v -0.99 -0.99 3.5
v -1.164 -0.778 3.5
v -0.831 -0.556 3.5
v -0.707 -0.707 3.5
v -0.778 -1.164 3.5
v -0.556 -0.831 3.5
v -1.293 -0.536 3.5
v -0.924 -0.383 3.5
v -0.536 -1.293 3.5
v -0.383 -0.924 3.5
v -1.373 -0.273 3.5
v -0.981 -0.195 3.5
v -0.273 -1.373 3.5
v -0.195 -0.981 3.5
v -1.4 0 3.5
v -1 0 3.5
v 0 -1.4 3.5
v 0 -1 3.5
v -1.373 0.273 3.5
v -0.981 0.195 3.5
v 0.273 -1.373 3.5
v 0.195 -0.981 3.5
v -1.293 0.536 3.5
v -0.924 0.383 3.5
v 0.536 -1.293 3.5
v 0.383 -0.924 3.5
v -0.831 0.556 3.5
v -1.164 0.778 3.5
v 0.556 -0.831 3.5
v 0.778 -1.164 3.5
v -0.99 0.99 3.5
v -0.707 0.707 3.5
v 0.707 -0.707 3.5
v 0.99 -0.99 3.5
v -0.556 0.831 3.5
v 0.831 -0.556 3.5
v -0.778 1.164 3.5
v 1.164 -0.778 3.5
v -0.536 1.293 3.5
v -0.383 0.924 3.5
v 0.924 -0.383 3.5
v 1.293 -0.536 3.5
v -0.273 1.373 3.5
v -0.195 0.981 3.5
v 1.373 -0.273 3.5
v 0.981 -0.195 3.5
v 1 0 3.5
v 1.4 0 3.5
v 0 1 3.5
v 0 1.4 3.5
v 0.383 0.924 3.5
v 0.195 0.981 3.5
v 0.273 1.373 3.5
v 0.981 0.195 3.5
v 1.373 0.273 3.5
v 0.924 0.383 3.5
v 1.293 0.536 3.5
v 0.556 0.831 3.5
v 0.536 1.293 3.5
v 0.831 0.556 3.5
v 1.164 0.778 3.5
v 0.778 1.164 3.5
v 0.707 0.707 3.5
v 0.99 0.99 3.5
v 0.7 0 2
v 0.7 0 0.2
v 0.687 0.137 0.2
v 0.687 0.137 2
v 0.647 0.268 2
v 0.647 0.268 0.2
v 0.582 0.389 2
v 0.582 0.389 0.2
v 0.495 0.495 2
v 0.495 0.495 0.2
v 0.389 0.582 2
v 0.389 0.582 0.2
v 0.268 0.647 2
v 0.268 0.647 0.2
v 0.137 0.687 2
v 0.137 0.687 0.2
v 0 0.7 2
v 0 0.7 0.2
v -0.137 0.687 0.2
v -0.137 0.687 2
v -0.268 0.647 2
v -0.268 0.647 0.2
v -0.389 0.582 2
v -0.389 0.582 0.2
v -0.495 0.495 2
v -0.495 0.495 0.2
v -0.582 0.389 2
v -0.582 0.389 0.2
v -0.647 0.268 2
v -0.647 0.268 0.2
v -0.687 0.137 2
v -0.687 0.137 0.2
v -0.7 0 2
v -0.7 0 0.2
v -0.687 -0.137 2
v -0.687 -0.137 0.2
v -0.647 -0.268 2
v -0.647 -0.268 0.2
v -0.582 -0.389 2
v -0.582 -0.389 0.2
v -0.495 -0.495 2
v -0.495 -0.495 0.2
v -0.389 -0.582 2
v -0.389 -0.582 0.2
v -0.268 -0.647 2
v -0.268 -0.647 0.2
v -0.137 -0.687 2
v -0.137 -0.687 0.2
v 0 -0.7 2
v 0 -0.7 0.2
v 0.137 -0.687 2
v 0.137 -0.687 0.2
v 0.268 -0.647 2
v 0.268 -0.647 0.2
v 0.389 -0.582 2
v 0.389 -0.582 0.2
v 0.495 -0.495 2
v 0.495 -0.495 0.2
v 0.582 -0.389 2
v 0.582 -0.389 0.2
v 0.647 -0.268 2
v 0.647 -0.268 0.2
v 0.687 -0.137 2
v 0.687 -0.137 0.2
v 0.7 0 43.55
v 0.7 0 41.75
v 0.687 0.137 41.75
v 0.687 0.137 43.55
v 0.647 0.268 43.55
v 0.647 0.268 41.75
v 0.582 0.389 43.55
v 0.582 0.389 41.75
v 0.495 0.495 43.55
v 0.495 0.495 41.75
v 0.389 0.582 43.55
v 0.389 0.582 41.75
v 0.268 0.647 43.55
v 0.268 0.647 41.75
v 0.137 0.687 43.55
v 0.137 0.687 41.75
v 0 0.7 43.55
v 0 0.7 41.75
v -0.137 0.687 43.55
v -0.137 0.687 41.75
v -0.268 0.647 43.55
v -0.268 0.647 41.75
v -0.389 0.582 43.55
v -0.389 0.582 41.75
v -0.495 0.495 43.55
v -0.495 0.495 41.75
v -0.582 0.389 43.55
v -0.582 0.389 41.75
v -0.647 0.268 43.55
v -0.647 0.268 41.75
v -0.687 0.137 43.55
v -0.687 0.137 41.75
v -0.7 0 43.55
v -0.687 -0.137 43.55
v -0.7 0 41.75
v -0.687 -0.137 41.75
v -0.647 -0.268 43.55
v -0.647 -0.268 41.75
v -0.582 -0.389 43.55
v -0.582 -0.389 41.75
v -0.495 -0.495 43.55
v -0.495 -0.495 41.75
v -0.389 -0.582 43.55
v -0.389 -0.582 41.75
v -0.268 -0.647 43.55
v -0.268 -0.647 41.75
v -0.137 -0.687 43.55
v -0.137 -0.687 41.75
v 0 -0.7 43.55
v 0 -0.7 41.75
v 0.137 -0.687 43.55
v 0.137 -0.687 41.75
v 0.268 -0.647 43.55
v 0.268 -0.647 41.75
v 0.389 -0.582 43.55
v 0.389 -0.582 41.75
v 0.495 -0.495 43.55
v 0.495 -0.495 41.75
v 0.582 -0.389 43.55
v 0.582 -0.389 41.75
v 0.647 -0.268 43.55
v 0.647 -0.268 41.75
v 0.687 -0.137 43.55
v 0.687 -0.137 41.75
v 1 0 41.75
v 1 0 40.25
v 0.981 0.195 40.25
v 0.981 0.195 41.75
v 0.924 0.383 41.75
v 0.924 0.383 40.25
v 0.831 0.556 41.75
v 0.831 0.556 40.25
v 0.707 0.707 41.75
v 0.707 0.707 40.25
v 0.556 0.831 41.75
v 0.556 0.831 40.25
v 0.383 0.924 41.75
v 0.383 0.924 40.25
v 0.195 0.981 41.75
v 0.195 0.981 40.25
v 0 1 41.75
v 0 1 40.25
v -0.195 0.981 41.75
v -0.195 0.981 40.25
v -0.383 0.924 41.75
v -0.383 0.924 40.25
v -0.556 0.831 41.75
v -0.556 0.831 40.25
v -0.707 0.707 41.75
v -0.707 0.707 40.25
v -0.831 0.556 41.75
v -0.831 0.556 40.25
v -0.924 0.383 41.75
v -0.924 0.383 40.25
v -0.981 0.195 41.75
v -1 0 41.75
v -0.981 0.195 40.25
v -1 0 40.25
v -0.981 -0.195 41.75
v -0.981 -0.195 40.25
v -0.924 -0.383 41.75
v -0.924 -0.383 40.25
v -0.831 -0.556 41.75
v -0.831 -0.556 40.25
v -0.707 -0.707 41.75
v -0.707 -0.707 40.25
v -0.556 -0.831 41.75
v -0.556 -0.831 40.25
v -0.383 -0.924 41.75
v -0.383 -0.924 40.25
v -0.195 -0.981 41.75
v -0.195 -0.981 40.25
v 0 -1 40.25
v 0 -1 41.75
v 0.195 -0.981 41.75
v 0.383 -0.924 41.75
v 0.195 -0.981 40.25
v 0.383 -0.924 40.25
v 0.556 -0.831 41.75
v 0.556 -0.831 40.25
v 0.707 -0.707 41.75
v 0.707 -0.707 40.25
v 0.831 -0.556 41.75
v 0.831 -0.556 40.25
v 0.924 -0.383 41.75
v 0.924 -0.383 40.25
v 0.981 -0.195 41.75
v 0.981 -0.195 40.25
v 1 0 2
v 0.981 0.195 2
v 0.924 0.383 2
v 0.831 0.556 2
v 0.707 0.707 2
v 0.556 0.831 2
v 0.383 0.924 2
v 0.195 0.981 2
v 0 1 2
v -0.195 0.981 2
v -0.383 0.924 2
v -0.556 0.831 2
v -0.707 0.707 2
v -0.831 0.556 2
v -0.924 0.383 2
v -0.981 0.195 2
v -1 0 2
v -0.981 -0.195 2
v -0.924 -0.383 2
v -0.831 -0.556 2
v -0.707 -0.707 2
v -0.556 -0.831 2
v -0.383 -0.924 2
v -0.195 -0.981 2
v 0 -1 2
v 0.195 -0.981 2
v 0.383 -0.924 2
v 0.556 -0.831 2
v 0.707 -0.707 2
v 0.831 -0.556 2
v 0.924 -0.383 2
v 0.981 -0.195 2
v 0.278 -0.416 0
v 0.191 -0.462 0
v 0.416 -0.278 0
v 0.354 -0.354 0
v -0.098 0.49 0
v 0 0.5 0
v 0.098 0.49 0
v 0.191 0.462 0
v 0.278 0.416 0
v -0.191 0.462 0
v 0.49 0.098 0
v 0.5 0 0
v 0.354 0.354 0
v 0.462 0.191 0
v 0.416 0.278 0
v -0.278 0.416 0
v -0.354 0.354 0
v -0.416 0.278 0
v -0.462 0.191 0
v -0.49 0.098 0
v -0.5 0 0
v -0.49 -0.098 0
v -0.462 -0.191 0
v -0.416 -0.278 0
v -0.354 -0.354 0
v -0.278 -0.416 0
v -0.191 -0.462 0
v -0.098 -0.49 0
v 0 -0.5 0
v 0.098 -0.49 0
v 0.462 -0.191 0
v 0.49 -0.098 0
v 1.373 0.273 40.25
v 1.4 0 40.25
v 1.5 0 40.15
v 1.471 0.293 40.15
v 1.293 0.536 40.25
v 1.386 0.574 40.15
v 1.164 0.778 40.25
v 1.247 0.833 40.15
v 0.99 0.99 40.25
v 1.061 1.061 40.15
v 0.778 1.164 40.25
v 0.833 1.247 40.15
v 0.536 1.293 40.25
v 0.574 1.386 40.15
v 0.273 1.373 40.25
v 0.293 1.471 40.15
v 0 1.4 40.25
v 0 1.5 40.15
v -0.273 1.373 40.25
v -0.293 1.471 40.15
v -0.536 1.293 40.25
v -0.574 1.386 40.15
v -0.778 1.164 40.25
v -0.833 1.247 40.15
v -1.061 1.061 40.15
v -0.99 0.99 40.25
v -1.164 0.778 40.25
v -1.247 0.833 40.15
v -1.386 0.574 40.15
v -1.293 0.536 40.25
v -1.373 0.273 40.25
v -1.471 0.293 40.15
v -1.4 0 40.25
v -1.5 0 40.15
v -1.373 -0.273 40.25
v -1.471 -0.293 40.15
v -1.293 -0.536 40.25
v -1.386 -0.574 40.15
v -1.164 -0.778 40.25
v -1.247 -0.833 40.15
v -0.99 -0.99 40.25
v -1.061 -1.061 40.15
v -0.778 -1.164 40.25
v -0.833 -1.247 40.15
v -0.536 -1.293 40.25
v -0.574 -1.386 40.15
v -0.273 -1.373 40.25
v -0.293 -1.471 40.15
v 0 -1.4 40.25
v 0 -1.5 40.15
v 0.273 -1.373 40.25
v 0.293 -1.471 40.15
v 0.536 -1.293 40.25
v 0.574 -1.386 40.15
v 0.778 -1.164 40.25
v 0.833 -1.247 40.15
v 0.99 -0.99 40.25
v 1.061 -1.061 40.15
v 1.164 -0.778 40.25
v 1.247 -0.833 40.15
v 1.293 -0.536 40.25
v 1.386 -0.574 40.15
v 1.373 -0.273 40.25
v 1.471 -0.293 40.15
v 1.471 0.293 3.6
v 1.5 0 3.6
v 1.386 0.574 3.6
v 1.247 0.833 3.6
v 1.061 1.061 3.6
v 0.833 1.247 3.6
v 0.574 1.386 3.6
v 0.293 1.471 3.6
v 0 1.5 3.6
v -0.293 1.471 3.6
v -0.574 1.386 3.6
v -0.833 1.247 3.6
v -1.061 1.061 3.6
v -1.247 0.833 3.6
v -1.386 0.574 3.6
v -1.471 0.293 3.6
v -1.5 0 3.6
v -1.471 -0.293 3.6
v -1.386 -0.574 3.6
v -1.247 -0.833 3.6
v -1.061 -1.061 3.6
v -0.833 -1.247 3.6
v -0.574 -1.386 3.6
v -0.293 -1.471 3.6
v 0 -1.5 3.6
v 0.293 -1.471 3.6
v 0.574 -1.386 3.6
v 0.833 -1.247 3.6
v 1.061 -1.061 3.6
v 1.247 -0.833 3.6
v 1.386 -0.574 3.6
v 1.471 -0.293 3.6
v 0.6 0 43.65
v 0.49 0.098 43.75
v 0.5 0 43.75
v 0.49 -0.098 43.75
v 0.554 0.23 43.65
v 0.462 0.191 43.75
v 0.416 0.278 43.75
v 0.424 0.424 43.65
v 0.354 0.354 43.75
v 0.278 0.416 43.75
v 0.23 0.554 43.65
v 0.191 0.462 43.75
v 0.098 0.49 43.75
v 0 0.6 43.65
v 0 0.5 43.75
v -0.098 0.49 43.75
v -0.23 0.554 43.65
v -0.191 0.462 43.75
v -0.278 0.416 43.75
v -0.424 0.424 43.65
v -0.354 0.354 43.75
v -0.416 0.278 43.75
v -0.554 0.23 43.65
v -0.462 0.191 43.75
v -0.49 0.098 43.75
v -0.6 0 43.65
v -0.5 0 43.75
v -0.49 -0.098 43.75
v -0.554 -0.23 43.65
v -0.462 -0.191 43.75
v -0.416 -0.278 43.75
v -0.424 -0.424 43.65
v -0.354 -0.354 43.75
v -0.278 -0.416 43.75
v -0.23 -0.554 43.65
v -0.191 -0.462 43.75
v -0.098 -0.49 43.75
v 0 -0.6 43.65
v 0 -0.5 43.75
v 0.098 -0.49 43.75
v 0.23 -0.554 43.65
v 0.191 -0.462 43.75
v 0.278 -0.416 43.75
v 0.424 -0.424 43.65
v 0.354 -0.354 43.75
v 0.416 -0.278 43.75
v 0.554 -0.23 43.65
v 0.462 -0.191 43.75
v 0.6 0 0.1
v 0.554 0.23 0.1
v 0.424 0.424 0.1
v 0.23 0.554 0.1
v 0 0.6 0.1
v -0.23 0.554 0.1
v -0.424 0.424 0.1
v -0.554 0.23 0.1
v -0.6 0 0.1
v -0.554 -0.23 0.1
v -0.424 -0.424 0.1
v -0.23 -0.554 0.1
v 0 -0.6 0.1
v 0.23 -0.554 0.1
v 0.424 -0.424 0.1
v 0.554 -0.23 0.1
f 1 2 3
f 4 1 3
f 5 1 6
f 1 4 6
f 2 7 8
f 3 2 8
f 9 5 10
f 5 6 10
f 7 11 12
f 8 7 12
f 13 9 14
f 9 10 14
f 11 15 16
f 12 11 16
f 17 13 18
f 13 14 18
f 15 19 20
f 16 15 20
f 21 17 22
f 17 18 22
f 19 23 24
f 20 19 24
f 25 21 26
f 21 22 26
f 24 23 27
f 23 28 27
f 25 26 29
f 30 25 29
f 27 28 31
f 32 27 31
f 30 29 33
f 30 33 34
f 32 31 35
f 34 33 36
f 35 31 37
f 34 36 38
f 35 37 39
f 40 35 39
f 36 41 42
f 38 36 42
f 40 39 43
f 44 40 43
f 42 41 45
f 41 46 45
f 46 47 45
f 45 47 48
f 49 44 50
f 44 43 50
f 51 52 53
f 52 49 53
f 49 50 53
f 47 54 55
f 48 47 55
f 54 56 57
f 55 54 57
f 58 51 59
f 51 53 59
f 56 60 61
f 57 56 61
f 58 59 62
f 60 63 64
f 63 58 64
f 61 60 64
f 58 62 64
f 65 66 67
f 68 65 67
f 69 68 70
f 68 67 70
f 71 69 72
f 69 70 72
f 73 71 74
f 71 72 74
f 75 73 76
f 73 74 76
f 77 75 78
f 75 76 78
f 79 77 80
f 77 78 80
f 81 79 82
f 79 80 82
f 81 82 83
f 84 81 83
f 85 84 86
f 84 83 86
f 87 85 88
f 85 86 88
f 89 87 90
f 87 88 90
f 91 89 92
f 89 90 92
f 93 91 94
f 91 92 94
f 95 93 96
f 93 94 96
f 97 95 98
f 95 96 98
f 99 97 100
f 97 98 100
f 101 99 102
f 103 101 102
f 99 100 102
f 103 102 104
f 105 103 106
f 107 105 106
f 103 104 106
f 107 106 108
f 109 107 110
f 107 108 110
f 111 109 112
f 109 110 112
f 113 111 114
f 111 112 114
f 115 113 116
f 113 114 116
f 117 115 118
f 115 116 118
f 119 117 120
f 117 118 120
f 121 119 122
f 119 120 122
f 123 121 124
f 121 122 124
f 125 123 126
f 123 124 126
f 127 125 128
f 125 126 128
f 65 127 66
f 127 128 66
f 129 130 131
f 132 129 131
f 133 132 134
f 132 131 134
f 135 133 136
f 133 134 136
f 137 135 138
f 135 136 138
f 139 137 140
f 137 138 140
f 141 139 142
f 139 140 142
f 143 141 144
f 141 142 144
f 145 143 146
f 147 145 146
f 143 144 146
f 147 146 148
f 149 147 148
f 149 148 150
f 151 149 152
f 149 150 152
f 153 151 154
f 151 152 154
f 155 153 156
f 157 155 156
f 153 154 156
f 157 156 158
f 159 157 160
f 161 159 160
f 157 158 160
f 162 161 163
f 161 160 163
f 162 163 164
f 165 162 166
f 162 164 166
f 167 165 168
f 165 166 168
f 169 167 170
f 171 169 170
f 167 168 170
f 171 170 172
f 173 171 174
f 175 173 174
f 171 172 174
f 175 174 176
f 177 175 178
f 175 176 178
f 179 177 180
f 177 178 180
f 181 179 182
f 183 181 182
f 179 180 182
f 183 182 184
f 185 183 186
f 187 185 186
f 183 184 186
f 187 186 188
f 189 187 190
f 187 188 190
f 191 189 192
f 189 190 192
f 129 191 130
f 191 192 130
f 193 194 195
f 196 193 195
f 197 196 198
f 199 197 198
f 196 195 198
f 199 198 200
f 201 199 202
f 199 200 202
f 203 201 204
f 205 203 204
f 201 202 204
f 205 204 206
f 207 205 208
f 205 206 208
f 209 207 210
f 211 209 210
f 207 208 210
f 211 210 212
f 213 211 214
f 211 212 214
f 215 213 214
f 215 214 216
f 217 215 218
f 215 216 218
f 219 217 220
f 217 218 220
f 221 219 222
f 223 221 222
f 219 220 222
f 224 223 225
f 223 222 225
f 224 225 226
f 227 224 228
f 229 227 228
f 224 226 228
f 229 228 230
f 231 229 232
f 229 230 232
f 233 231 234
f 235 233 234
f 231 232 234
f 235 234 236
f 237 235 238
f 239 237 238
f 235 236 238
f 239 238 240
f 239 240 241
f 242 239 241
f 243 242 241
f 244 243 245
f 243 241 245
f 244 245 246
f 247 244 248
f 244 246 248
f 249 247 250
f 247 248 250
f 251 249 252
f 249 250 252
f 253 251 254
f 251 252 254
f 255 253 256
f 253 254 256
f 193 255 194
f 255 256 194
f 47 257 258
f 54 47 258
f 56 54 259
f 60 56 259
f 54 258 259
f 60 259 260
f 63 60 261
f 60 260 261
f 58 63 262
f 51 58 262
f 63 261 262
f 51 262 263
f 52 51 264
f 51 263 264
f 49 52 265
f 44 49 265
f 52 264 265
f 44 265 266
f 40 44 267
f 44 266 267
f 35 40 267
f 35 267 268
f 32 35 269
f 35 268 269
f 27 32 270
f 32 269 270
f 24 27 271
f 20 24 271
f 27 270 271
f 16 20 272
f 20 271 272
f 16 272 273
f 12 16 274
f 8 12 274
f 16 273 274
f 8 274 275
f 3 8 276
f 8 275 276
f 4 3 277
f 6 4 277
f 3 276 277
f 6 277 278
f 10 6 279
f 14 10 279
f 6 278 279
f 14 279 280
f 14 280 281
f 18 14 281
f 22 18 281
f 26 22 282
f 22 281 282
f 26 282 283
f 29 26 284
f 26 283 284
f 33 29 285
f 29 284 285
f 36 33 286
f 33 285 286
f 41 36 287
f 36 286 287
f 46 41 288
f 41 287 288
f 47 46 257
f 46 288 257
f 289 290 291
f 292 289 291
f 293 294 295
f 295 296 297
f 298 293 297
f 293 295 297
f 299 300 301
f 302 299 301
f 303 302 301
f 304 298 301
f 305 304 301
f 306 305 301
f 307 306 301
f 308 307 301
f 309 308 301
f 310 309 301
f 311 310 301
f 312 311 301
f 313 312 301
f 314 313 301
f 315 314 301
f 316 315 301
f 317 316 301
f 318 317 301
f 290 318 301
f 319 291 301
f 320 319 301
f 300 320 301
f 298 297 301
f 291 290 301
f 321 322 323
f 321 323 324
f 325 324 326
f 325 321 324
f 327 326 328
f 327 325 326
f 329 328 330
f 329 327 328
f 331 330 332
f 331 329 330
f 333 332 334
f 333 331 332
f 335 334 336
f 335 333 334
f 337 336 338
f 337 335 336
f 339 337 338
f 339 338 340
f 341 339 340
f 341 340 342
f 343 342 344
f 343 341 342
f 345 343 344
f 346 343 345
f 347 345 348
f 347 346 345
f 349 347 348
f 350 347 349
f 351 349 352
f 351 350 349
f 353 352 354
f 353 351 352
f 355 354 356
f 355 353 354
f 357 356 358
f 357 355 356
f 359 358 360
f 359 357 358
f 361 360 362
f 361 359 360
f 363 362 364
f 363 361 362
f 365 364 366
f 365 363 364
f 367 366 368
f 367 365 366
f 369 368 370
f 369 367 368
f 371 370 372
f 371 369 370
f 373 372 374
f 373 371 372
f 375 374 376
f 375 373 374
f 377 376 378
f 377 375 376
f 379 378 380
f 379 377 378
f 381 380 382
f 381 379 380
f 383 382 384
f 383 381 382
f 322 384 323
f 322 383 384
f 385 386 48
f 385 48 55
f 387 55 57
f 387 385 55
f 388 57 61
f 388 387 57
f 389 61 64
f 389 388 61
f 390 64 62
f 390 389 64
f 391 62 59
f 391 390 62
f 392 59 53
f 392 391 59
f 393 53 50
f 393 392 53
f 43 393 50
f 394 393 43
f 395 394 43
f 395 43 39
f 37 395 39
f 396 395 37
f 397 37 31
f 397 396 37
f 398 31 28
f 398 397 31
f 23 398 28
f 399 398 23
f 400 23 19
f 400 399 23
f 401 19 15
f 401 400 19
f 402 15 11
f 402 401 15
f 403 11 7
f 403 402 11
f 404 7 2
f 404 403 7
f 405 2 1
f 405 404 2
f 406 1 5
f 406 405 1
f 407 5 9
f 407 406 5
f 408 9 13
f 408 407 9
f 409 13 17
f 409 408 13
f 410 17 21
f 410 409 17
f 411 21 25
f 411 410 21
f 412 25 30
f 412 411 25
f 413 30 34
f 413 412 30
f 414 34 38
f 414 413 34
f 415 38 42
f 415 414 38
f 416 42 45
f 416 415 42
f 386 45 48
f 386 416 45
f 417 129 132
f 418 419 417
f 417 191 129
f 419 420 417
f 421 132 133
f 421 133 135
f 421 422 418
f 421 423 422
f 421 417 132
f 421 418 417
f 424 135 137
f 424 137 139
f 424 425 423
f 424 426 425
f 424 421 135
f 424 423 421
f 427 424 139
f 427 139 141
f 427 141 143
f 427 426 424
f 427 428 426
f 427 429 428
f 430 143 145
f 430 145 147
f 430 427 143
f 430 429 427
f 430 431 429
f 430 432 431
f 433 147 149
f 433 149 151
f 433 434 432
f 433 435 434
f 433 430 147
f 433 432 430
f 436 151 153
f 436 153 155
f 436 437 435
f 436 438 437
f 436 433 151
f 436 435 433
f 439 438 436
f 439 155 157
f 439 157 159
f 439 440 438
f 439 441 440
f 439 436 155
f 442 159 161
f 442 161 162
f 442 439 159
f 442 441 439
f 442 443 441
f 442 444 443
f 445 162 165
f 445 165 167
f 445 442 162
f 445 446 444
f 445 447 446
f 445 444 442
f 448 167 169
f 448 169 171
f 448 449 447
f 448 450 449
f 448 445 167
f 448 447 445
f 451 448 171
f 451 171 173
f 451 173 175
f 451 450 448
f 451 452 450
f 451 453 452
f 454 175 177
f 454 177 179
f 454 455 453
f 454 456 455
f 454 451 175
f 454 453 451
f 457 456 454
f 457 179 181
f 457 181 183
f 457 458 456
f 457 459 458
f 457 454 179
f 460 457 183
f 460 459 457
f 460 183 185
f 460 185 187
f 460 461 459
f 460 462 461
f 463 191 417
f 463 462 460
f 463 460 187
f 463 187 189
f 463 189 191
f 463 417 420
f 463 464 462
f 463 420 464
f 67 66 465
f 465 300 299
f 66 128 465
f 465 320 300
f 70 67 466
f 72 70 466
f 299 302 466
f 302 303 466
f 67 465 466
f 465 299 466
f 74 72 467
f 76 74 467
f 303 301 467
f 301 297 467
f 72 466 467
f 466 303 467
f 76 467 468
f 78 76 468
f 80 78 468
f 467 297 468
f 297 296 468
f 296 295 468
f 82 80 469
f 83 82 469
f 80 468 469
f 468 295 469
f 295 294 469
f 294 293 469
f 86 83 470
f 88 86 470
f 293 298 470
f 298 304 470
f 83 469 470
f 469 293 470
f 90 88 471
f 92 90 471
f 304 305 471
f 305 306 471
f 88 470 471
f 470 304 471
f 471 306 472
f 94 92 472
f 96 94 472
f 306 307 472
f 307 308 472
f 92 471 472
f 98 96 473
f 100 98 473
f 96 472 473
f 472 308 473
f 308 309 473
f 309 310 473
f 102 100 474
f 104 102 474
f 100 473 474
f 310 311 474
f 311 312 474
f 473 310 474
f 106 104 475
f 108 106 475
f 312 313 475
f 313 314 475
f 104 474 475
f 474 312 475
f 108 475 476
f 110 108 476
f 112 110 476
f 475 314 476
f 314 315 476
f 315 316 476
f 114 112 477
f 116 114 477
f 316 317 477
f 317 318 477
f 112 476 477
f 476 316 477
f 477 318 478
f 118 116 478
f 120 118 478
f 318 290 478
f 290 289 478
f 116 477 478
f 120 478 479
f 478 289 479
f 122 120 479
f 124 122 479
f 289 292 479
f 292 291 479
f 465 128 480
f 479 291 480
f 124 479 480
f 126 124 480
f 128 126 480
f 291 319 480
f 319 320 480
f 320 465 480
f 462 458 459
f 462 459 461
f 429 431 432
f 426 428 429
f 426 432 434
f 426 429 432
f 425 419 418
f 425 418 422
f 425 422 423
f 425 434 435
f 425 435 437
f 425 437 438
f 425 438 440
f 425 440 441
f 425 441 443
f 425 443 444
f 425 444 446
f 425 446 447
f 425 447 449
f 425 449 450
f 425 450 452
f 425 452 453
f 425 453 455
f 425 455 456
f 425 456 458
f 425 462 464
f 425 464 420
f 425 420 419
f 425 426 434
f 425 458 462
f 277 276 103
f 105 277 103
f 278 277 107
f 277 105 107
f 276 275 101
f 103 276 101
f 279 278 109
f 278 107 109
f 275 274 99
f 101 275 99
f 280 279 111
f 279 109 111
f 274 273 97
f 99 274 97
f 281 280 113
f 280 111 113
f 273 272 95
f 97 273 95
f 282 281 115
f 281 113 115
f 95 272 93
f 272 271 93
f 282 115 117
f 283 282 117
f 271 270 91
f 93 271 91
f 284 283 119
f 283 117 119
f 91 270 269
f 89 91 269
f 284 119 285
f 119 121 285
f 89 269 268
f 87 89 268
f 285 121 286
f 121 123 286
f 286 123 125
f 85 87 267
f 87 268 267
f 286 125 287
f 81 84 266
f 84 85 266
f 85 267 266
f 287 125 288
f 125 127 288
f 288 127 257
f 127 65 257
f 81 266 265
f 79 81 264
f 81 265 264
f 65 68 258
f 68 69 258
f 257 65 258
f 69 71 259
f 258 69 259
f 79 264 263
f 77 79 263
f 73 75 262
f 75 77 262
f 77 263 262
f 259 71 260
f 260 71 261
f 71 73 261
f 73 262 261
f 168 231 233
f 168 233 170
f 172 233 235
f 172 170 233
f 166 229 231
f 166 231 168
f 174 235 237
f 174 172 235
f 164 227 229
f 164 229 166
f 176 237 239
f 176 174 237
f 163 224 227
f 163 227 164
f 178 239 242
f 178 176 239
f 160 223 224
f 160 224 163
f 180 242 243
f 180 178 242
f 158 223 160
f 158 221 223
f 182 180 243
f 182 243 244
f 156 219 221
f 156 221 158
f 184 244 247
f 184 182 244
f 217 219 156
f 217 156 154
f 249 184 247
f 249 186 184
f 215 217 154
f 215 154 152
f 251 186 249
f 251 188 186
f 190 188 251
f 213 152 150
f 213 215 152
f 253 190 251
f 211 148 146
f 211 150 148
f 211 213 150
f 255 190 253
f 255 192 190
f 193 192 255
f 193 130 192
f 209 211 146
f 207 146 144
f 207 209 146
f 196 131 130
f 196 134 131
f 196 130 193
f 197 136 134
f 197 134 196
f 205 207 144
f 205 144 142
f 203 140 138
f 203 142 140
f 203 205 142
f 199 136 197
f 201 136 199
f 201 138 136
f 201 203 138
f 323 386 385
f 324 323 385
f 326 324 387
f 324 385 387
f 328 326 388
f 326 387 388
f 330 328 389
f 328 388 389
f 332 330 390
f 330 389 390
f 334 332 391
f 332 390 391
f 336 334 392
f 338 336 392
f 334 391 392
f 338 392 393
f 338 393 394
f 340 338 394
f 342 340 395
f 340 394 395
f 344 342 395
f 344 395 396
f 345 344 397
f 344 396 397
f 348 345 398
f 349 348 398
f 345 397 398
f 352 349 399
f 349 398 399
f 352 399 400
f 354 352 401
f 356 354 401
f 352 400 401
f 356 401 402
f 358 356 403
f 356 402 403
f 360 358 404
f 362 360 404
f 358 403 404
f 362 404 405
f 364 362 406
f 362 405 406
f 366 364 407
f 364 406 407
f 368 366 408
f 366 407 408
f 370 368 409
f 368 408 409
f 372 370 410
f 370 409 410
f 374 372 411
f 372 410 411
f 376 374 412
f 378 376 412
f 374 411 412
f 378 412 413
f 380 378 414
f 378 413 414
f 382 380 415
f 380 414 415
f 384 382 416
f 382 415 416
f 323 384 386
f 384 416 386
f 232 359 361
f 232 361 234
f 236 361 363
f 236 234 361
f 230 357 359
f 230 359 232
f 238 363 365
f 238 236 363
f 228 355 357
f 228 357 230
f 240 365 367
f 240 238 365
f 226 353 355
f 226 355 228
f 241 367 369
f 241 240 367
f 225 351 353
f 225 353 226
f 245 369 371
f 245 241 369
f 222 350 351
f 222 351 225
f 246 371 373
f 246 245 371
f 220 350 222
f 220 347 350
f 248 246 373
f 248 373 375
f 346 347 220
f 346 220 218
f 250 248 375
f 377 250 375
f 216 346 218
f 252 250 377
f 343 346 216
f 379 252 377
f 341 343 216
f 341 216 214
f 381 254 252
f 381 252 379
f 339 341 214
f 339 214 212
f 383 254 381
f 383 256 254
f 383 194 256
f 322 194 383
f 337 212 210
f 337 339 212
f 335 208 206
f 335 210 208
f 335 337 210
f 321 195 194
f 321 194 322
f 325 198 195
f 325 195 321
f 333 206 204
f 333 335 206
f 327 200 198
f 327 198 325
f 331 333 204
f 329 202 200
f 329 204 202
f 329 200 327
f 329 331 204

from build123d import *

# Parameters (mm, degrees)
F0_R     = 0.7
F1_DEPTH = 2
F2_R     = 1
F2_R_2   = 0.7
F3_DEPTH = 1.5
F4_R     = 1.5
F4_R_2   = 1
F5_DEPTH = 36.75
F6_R     = 1
F7_DEPTH = 1.5
F8_R     = 0.7
F9_DEPTH = 2
F10_SIZE = 0.2
F11_SIZE = 0.1


with BuildPart() as f1:
    # F0 (on Top) → F1 (new body)
    with BuildSketch(Plane.XY):
        Circle(F0_R)
    extrude(amount=F1_DEPTH)

    # F2 (on face) → F3 (join)
    with BuildSketch(Plane.XY.offset(2)):
        Circle(F2_R)
        Circle(F2_R_2, mode=Mode.SUBTRACT)
        Circle(F2_R_2)
    extrude(amount=F3_DEPTH)

    # F4 (on face) → F5 (join)
    with BuildSketch(Plane.XY.offset(3.5)):
        Circle(F4_R)
        Circle(F4_R_2, mode=Mode.SUBTRACT)
        Circle(F4_R_2)
    extrude(amount=F5_DEPTH)

    # F6 (on face) → F7 (join)
    with BuildSketch(Plane.XY.offset(40.25)):
        Circle(F6_R)
    extrude(amount=F7_DEPTH)

    # F8 (on face) → F9 (join)
    with BuildSketch(Plane.XY.offset(41.75)):
        Circle(F8_R)
    extrude(amount=F9_DEPTH)

    # F10
    f10_edges = [f1.edges().sort_by_distance(p)[0] for p in [
        (-0.7, 0, 0),
        (-0.7, 0, 43.75),
    ]]
    chamfer(f10_edges, length=F10_SIZE)

    # F11
    f11_edges = [f1.edges().sort_by_distance(p)[0] for p in [
        (-1.5, 0, 40.25),
        (-1.5, 0, 3.5),
    ]]
    chamfer(f11_edges, length=F11_SIZE)


solid = f1.part
